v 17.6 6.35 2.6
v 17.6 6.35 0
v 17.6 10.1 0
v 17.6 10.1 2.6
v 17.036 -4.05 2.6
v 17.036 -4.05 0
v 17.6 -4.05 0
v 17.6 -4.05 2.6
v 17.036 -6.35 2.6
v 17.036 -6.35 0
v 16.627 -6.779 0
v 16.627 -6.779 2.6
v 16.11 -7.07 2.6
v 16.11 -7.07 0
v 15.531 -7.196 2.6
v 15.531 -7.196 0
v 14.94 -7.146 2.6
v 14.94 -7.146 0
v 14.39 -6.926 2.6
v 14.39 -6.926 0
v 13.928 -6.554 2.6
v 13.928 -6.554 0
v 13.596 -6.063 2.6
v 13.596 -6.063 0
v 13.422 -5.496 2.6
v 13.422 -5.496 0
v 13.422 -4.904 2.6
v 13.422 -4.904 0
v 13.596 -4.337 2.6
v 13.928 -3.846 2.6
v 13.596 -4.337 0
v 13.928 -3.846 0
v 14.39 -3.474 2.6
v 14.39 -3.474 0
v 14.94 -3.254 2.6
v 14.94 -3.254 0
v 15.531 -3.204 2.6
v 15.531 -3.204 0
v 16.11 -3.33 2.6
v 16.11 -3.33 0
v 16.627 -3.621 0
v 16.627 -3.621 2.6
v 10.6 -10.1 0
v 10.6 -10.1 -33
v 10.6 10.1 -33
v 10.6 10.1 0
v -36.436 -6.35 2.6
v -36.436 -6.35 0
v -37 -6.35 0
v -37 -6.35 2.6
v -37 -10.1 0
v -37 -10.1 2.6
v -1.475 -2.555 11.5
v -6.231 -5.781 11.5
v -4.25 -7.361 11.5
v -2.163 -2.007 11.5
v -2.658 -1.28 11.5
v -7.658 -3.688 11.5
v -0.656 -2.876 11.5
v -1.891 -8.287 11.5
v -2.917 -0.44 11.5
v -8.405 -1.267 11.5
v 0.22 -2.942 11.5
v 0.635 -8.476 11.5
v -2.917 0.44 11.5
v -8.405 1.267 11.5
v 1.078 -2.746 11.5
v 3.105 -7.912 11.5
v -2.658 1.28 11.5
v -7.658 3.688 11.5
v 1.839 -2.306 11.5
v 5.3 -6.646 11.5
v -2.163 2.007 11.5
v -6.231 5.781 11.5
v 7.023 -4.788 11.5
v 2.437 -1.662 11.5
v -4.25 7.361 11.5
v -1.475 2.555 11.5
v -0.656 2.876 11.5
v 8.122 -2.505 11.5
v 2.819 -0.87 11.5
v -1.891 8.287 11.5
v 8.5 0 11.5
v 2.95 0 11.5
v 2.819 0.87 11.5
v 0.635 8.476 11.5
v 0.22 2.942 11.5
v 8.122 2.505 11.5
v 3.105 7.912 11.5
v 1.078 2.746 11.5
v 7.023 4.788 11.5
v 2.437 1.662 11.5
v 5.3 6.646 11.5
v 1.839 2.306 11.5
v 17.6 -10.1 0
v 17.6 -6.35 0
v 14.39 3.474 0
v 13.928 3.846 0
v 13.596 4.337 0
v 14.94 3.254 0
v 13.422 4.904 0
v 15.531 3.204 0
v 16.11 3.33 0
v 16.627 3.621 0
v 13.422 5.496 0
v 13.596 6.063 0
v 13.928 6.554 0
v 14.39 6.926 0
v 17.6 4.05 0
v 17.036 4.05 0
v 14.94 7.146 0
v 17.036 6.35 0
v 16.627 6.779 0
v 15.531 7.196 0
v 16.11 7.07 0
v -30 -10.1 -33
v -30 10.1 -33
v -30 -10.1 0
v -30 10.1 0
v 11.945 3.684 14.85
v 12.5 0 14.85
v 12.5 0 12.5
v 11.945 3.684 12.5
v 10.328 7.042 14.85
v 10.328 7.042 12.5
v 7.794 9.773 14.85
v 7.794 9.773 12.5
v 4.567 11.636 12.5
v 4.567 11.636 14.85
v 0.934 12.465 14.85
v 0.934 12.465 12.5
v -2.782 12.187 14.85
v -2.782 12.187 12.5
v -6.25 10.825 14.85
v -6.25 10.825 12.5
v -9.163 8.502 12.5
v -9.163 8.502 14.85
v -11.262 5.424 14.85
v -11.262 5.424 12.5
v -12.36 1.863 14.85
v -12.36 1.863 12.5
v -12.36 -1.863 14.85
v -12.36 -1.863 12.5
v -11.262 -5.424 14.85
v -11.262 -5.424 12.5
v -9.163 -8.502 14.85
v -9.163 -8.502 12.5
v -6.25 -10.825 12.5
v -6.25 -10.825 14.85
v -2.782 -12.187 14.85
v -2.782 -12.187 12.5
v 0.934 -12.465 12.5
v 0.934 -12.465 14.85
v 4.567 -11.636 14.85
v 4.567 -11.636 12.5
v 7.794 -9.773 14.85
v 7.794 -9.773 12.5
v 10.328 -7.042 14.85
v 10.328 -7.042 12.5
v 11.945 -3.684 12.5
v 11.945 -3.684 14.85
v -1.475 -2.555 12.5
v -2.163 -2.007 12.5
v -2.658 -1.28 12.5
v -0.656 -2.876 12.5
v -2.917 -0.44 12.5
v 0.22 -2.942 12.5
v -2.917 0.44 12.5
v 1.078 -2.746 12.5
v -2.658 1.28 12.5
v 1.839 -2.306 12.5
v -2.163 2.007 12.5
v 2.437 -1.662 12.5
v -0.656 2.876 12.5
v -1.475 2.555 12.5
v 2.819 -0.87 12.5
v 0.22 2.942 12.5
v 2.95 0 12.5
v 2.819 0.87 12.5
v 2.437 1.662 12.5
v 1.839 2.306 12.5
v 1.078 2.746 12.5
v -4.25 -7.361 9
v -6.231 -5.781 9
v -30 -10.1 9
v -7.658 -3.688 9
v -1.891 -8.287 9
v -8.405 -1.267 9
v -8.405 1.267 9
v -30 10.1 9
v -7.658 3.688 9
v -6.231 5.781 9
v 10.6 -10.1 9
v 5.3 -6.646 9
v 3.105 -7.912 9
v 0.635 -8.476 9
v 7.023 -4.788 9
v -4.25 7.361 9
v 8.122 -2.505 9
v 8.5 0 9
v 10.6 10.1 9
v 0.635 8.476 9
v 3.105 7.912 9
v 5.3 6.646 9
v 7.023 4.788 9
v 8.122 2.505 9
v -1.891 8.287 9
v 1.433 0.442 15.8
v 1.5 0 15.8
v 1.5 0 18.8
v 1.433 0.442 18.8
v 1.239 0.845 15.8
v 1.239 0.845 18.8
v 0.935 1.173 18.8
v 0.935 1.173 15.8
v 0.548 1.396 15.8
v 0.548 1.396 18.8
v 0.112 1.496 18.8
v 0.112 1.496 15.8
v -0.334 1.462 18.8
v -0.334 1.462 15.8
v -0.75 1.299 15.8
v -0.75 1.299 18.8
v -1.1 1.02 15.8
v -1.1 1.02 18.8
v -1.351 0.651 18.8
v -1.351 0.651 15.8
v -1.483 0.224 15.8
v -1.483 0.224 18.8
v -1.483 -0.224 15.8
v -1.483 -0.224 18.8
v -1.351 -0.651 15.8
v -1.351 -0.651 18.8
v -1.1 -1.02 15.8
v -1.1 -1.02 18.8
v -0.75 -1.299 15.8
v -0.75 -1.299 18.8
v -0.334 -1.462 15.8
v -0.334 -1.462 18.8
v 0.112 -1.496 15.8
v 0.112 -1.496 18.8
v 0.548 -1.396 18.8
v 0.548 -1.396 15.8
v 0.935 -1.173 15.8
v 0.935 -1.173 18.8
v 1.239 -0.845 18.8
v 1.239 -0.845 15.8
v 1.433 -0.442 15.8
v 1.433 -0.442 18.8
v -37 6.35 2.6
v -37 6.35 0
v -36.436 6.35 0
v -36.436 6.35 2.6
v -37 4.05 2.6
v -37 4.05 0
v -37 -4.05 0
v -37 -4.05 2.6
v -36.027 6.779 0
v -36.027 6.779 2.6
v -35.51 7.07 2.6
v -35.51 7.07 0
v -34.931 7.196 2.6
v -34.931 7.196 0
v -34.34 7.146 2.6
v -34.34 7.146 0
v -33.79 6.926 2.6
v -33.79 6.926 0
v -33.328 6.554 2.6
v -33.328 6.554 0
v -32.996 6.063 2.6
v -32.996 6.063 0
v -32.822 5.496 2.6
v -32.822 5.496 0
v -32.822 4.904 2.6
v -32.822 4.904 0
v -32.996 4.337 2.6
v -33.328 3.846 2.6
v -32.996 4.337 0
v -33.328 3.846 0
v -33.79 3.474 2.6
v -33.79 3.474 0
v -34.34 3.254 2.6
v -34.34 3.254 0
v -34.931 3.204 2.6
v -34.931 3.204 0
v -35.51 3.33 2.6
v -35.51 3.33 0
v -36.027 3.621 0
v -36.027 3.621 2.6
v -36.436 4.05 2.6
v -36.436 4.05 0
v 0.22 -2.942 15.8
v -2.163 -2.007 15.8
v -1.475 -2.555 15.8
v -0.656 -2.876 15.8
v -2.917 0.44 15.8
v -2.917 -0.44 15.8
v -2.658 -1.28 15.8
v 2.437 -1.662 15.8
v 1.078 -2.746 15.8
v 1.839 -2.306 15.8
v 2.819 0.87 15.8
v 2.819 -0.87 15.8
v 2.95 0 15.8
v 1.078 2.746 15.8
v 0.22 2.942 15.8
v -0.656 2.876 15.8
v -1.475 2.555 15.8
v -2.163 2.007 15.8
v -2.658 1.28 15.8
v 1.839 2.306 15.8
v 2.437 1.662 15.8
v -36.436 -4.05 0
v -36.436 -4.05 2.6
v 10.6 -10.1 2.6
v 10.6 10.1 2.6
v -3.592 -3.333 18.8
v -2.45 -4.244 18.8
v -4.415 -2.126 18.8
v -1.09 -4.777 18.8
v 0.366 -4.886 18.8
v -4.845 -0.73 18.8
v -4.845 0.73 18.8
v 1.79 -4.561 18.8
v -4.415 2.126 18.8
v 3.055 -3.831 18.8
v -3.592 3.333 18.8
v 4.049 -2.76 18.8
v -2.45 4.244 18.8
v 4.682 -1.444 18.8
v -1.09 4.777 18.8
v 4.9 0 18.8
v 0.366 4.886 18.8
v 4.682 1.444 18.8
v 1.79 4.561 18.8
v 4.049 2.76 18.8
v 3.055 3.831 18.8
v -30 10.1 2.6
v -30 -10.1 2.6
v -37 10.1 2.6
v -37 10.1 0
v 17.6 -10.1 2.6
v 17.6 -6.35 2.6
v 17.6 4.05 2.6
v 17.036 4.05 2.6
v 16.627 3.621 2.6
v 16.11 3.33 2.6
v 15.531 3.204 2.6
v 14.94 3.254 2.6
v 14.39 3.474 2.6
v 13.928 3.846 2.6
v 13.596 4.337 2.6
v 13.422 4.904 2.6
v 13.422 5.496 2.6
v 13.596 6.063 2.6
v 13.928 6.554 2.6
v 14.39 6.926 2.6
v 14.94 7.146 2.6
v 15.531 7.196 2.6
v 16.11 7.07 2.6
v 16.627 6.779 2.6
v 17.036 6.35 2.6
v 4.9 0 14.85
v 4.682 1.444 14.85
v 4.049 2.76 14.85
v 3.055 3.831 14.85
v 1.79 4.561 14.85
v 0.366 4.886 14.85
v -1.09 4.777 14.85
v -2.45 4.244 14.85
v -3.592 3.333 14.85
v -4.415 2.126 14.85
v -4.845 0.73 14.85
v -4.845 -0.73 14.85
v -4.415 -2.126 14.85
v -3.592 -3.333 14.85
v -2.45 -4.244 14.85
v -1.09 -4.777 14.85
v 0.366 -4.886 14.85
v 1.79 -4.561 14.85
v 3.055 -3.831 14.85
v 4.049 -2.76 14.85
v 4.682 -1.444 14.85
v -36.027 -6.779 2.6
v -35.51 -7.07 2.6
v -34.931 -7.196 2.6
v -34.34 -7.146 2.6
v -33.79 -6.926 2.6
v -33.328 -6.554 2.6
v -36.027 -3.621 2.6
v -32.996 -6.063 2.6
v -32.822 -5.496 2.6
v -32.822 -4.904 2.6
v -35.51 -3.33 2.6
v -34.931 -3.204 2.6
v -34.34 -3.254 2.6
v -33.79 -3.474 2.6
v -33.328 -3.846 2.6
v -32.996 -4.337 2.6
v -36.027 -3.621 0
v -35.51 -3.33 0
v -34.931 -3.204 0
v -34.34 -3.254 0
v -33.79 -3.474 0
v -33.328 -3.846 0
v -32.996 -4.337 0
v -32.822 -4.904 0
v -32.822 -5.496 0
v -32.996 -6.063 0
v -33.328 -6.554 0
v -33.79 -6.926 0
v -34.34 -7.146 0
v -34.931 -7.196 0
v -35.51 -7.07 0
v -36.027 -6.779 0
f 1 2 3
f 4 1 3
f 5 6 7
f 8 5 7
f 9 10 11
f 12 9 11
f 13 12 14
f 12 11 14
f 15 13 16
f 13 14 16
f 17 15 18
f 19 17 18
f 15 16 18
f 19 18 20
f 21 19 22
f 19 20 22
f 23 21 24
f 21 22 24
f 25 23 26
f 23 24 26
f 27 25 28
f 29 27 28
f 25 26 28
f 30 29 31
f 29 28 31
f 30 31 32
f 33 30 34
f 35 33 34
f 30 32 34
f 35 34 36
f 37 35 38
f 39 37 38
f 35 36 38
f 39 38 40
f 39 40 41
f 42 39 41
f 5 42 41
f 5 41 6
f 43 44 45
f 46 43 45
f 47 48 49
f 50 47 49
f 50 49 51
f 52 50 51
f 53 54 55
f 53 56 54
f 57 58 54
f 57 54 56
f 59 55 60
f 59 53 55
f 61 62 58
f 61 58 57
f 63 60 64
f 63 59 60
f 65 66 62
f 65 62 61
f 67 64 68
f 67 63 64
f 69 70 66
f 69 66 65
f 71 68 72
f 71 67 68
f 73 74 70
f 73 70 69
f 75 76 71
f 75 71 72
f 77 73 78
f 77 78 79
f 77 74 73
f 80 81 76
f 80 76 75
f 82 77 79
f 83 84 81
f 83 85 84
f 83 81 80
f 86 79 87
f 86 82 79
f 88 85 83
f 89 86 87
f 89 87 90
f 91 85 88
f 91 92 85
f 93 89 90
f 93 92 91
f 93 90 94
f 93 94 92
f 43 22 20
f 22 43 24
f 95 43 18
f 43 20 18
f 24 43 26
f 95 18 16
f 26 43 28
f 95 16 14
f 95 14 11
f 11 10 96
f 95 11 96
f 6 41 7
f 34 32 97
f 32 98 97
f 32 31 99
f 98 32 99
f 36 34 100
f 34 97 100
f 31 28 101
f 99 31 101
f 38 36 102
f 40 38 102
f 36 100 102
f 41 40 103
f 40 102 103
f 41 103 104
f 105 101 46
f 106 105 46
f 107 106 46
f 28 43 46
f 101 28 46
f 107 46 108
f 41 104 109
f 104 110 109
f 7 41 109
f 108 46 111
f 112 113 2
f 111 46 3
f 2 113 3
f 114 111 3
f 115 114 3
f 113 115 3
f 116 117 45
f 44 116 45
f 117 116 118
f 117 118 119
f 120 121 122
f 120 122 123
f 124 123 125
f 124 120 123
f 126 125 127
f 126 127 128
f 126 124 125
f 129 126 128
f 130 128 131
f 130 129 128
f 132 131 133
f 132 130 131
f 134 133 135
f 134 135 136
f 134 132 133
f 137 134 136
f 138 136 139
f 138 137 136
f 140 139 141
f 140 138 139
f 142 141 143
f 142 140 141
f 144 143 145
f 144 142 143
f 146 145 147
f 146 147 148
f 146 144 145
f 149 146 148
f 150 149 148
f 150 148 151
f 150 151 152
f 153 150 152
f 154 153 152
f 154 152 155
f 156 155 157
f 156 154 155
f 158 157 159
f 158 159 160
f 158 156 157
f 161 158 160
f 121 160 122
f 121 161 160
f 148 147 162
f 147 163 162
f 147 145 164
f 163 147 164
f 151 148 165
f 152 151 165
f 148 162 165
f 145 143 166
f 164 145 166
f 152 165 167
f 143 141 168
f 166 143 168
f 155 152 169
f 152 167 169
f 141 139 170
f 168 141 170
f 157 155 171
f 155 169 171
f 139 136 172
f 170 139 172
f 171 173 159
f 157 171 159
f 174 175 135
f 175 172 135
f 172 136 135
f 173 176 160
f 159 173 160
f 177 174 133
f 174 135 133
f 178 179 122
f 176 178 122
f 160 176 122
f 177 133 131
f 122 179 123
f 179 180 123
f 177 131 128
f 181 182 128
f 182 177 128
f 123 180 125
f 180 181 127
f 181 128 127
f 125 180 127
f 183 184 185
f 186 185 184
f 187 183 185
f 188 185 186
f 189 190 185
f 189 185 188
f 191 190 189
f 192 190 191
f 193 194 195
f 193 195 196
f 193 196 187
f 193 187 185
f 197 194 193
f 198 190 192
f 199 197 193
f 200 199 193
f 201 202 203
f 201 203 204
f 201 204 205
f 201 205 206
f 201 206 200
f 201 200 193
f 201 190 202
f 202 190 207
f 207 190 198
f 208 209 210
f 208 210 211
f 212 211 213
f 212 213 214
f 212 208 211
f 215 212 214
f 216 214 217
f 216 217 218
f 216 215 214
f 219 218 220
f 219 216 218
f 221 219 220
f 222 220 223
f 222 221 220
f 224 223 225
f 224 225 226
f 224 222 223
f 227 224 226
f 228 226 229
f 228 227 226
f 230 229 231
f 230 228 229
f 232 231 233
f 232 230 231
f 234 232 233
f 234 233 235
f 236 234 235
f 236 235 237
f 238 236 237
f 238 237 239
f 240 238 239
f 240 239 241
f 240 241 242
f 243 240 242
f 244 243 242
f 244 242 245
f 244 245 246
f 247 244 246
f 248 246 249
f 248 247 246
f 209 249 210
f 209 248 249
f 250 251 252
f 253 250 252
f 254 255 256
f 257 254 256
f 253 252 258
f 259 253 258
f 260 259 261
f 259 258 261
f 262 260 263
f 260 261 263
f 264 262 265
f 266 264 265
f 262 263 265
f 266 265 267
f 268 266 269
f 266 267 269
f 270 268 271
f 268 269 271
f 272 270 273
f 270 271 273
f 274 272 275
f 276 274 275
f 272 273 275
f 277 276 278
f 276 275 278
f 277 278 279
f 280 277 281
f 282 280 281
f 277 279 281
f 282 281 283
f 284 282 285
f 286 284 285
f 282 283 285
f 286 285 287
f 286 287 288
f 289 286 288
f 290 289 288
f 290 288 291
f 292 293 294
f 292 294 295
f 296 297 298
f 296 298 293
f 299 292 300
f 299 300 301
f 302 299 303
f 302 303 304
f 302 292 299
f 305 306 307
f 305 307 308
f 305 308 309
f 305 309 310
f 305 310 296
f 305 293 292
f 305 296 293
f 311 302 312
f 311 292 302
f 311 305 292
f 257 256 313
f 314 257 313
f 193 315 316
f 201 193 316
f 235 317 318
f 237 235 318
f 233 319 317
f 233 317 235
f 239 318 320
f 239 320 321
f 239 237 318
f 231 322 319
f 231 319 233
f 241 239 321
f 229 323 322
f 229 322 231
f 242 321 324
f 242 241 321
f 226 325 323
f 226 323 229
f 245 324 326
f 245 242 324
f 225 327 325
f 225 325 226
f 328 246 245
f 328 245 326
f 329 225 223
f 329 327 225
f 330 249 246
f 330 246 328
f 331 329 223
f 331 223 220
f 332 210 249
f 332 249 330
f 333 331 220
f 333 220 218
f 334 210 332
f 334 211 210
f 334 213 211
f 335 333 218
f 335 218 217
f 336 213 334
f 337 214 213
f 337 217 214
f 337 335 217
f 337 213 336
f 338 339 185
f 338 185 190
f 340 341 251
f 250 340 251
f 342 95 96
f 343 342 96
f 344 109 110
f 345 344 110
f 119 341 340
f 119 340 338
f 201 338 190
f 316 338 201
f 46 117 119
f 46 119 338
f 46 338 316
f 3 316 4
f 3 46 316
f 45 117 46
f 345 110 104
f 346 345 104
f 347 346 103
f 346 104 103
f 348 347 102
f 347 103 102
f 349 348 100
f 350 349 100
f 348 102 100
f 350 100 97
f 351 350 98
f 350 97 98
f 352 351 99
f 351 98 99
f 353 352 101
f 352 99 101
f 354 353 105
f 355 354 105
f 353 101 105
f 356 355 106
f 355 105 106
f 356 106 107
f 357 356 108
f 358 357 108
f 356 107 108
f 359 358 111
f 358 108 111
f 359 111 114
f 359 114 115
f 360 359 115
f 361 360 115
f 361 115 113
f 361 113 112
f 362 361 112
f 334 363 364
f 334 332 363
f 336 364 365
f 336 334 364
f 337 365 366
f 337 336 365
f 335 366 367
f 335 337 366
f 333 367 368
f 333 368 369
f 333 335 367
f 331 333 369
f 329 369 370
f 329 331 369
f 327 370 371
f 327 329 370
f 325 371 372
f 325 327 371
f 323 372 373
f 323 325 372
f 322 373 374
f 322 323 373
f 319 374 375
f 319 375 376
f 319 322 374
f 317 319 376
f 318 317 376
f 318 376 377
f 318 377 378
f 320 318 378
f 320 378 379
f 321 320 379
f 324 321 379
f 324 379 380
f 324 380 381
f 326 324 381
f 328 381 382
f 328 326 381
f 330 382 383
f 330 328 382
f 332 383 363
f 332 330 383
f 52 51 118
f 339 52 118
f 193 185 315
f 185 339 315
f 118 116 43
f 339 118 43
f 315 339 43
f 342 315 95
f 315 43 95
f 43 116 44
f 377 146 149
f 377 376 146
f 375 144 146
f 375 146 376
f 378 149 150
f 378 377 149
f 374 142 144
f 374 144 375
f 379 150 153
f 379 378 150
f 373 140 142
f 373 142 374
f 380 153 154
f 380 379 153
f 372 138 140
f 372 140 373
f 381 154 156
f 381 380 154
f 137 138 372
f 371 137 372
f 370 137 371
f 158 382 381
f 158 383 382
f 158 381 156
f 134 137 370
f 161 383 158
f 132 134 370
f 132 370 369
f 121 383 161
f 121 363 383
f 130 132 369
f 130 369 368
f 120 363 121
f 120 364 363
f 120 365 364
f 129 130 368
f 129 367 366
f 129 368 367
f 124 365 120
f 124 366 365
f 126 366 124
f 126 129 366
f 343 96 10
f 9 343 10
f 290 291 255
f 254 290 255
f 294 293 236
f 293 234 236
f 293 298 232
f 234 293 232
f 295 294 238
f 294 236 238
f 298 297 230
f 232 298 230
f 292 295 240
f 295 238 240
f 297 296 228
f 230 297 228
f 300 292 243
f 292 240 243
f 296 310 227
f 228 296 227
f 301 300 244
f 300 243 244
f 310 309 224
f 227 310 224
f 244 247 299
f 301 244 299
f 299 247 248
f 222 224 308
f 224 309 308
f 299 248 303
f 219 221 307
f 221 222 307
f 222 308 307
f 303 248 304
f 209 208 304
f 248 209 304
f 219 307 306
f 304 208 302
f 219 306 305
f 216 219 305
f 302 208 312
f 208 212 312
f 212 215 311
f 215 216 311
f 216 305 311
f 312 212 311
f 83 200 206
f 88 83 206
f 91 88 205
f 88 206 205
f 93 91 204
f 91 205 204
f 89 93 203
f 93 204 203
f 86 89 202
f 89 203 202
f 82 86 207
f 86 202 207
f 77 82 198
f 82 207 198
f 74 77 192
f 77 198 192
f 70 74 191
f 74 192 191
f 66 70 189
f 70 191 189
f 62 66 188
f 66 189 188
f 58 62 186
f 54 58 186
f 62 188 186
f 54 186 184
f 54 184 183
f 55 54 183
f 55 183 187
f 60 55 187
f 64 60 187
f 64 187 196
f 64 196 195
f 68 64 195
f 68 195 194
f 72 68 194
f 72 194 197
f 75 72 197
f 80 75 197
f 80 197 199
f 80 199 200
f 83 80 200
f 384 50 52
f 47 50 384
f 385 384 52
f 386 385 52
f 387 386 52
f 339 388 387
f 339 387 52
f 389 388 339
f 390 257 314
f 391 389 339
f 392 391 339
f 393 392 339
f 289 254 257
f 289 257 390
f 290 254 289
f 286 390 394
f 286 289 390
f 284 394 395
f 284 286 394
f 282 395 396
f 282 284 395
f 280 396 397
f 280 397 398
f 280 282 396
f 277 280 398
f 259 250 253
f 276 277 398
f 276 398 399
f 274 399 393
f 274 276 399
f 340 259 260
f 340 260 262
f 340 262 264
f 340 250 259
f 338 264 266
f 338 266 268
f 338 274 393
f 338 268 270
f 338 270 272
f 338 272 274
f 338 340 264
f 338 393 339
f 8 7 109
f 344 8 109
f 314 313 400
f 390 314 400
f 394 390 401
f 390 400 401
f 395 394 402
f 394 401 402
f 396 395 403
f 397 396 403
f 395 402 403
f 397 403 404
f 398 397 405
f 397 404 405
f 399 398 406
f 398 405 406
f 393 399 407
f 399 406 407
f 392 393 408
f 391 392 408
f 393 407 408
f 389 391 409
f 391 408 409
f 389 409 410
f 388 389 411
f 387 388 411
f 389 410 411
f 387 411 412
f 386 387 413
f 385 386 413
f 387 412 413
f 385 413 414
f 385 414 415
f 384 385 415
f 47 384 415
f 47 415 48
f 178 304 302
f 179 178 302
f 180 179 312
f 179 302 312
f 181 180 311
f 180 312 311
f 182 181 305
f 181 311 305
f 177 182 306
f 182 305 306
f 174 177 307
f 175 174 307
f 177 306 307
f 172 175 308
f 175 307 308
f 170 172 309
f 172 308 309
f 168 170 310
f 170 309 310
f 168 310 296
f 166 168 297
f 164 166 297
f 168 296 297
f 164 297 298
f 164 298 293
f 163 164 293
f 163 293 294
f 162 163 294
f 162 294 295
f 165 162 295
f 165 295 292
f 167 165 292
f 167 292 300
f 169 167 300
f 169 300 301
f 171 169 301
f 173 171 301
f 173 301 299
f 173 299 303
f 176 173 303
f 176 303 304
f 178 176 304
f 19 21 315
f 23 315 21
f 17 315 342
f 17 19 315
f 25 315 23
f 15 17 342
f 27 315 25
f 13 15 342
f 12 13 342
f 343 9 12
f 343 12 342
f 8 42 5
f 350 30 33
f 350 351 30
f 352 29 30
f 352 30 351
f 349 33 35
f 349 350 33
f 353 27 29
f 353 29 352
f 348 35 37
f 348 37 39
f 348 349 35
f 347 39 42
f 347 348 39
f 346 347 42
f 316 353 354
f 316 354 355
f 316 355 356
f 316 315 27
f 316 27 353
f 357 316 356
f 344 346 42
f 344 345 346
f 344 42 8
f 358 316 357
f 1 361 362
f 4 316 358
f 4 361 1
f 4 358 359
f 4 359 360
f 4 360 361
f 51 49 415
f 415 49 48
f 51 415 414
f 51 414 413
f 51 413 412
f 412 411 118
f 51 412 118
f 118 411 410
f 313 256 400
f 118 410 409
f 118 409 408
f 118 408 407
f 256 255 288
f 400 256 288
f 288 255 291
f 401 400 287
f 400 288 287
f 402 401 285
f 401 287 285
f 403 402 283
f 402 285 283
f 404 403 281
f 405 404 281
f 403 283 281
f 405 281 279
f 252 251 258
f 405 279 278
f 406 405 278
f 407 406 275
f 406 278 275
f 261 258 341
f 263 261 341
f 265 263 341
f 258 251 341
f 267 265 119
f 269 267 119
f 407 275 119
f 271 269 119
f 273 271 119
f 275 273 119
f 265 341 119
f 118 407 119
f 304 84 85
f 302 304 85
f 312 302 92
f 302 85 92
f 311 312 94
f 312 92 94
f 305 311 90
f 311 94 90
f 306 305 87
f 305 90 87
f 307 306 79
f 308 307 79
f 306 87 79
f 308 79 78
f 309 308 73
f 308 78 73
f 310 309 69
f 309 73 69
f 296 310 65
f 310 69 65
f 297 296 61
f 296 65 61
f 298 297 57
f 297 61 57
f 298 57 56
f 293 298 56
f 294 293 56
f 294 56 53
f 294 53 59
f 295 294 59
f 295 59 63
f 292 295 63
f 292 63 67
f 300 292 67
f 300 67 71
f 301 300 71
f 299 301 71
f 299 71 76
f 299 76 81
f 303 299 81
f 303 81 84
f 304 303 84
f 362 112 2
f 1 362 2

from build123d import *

# Parameters (mm, degrees)
F0_W          = 40.6
F0_H          = 20.2
F0_R          = 8.5
F0_R_2        = 2.95
F1_DEPTH      = 33
F1_DEPTH_BACK = 9
F2_DEPTH      = 2.6
F3_DEPTH      = 11.5
F4_DEPTH      = 15.8
F5_R          = 4.9
F5_R_2        = 2.95
F6_DEPTH      = 3.3
F6_DEPTH_BACK = 3
F7_START      = -0.95
F5_R_3        = 12.5
F7_DEPTH      = 2.35
F5_R_4        = 1.5
F8_DEPTH      = 3


# Not quite as in the source:
# - a feature names something its author has since deleted; it is built from what else it names


with BuildPart() as f1:
    # F0 (on Top) → F1 (new body, two sides)
    with BuildSketch(Plane.XY) as f1_sk:
        with Locations((-9.7, 0)):
            Rectangle(F0_W, F0_H)
        Circle(F0_R, mode=Mode.SUBTRACT)
        Circle(F0_R)
        Circle(F0_R_2, mode=Mode.SUBTRACT)
        Circle(F0_R_2)
    extrude(amount=-F1_DEPTH)
    extrude(f1_sk.sketch, amount=F1_DEPTH_BACK)

    # F0 (on Top) → F2 (join)
    with BuildSketch(Plane.XY):
        with BuildLine():
            Line((-30, -10.1), (-30, 10.1))
            Line((-30, 10.1), (-37, 10.1))
            Line((-37, 10.1), (-37, 6.35))
            Line((-37, 6.35), (-36.4363068172, 6.35))
            ThreePointArc((-36.4363068172, 6.35), (-32.8, 5.2), (-36.4363068172, 4.05))
            Line((-36.4363068172, 4.05), (-37, 4.05))
            Line((-37, 4.05), (-37, -4.05))
            Line((-37, -4.05), (-36.4363068172, -4.05))
            ThreePointArc((-36.4363068172, -4.05), (-32.8, -5.2), (-36.4363068172, -6.35))
            Line((-36.4363068172, -6.35), (-37, -6.35))
            Line((-37, -6.35), (-37, -10.1))
            Line((-37, -10.1), (-30, -10.1))
        make_face()
        with BuildLine():
            Line((17.6, 10.1), (10.6, 10.1))
            Line((10.6, 10.1), (10.6, -10.1))
            Line((10.6, -10.1), (17.6, -10.1))
            Line((17.6, -10.1), (17.6, -6.35))
            Line((17.6, -6.35), (17.0363068172, -6.35))
            ThreePointArc((17.0363068172, -6.35), (13.4, -5.2), (17.0363068172, -4.05))
            Line((17.0363068172, -4.05), (17.6, -4.05))
            Line((17.6, -4.05), (17.6, 4.05))
            Line((17.6, 4.05), (17.0363068172, 4.05))
            ThreePointArc((17.0363068172, 4.05), (13.4, 5.2), (17.0363068172, 6.35))
            Line((17.0363068172, 6.35), (17.6, 6.35))
            Line((17.6, 6.35), (17.6, 10.1))
        make_face()
    extrude(amount=F2_DEPTH)

    # F0 (on Top) → F3 (join)
    with BuildSketch(Plane.XY):
        Circle(F0_R)
        Circle(F0_R_2, mode=Mode.SUBTRACT)
        Circle(F0_R_2)
    extrude(amount=F3_DEPTH)

    # F0 (on Top) → F4 (join)
    with BuildSketch(Plane.XY):
        Circle(F0_R_2)
    extrude(amount=F4_DEPTH)


with BuildPart() as f6:
    # F5 (on face) → F6 (new body, two sides)
    with BuildSketch(Plane.XY.offset(15.8)) as f6_sk:
        Circle(F5_R)
        Circle(F5_R_2, mode=Mode.SUBTRACT)
    extrude(amount=-F6_DEPTH)
    extrude(f6_sk.sketch, amount=F6_DEPTH_BACK)

    # F5 (on face) → F7 (join)
    with BuildSketch(Plane.XY.offset(15.8).offset(F7_START)):
        Circle(F5_R_3)
        Circle(F5_R, mode=Mode.SUBTRACT)
        Circle(F5_R)
        Circle(F5_R_2, mode=Mode.SUBTRACT)
    extrude(amount=-F7_DEPTH)

    # F5 (on face) → F8 (join)
    with BuildSketch(Plane.XY.offset(15.8)):
        Circle(F5_R_2)
        Circle(F5_R_4, mode=Mode.SUBTRACT)
    extrude(amount=F8_DEPTH)


solid = Compound([f1.part, f6.part])
